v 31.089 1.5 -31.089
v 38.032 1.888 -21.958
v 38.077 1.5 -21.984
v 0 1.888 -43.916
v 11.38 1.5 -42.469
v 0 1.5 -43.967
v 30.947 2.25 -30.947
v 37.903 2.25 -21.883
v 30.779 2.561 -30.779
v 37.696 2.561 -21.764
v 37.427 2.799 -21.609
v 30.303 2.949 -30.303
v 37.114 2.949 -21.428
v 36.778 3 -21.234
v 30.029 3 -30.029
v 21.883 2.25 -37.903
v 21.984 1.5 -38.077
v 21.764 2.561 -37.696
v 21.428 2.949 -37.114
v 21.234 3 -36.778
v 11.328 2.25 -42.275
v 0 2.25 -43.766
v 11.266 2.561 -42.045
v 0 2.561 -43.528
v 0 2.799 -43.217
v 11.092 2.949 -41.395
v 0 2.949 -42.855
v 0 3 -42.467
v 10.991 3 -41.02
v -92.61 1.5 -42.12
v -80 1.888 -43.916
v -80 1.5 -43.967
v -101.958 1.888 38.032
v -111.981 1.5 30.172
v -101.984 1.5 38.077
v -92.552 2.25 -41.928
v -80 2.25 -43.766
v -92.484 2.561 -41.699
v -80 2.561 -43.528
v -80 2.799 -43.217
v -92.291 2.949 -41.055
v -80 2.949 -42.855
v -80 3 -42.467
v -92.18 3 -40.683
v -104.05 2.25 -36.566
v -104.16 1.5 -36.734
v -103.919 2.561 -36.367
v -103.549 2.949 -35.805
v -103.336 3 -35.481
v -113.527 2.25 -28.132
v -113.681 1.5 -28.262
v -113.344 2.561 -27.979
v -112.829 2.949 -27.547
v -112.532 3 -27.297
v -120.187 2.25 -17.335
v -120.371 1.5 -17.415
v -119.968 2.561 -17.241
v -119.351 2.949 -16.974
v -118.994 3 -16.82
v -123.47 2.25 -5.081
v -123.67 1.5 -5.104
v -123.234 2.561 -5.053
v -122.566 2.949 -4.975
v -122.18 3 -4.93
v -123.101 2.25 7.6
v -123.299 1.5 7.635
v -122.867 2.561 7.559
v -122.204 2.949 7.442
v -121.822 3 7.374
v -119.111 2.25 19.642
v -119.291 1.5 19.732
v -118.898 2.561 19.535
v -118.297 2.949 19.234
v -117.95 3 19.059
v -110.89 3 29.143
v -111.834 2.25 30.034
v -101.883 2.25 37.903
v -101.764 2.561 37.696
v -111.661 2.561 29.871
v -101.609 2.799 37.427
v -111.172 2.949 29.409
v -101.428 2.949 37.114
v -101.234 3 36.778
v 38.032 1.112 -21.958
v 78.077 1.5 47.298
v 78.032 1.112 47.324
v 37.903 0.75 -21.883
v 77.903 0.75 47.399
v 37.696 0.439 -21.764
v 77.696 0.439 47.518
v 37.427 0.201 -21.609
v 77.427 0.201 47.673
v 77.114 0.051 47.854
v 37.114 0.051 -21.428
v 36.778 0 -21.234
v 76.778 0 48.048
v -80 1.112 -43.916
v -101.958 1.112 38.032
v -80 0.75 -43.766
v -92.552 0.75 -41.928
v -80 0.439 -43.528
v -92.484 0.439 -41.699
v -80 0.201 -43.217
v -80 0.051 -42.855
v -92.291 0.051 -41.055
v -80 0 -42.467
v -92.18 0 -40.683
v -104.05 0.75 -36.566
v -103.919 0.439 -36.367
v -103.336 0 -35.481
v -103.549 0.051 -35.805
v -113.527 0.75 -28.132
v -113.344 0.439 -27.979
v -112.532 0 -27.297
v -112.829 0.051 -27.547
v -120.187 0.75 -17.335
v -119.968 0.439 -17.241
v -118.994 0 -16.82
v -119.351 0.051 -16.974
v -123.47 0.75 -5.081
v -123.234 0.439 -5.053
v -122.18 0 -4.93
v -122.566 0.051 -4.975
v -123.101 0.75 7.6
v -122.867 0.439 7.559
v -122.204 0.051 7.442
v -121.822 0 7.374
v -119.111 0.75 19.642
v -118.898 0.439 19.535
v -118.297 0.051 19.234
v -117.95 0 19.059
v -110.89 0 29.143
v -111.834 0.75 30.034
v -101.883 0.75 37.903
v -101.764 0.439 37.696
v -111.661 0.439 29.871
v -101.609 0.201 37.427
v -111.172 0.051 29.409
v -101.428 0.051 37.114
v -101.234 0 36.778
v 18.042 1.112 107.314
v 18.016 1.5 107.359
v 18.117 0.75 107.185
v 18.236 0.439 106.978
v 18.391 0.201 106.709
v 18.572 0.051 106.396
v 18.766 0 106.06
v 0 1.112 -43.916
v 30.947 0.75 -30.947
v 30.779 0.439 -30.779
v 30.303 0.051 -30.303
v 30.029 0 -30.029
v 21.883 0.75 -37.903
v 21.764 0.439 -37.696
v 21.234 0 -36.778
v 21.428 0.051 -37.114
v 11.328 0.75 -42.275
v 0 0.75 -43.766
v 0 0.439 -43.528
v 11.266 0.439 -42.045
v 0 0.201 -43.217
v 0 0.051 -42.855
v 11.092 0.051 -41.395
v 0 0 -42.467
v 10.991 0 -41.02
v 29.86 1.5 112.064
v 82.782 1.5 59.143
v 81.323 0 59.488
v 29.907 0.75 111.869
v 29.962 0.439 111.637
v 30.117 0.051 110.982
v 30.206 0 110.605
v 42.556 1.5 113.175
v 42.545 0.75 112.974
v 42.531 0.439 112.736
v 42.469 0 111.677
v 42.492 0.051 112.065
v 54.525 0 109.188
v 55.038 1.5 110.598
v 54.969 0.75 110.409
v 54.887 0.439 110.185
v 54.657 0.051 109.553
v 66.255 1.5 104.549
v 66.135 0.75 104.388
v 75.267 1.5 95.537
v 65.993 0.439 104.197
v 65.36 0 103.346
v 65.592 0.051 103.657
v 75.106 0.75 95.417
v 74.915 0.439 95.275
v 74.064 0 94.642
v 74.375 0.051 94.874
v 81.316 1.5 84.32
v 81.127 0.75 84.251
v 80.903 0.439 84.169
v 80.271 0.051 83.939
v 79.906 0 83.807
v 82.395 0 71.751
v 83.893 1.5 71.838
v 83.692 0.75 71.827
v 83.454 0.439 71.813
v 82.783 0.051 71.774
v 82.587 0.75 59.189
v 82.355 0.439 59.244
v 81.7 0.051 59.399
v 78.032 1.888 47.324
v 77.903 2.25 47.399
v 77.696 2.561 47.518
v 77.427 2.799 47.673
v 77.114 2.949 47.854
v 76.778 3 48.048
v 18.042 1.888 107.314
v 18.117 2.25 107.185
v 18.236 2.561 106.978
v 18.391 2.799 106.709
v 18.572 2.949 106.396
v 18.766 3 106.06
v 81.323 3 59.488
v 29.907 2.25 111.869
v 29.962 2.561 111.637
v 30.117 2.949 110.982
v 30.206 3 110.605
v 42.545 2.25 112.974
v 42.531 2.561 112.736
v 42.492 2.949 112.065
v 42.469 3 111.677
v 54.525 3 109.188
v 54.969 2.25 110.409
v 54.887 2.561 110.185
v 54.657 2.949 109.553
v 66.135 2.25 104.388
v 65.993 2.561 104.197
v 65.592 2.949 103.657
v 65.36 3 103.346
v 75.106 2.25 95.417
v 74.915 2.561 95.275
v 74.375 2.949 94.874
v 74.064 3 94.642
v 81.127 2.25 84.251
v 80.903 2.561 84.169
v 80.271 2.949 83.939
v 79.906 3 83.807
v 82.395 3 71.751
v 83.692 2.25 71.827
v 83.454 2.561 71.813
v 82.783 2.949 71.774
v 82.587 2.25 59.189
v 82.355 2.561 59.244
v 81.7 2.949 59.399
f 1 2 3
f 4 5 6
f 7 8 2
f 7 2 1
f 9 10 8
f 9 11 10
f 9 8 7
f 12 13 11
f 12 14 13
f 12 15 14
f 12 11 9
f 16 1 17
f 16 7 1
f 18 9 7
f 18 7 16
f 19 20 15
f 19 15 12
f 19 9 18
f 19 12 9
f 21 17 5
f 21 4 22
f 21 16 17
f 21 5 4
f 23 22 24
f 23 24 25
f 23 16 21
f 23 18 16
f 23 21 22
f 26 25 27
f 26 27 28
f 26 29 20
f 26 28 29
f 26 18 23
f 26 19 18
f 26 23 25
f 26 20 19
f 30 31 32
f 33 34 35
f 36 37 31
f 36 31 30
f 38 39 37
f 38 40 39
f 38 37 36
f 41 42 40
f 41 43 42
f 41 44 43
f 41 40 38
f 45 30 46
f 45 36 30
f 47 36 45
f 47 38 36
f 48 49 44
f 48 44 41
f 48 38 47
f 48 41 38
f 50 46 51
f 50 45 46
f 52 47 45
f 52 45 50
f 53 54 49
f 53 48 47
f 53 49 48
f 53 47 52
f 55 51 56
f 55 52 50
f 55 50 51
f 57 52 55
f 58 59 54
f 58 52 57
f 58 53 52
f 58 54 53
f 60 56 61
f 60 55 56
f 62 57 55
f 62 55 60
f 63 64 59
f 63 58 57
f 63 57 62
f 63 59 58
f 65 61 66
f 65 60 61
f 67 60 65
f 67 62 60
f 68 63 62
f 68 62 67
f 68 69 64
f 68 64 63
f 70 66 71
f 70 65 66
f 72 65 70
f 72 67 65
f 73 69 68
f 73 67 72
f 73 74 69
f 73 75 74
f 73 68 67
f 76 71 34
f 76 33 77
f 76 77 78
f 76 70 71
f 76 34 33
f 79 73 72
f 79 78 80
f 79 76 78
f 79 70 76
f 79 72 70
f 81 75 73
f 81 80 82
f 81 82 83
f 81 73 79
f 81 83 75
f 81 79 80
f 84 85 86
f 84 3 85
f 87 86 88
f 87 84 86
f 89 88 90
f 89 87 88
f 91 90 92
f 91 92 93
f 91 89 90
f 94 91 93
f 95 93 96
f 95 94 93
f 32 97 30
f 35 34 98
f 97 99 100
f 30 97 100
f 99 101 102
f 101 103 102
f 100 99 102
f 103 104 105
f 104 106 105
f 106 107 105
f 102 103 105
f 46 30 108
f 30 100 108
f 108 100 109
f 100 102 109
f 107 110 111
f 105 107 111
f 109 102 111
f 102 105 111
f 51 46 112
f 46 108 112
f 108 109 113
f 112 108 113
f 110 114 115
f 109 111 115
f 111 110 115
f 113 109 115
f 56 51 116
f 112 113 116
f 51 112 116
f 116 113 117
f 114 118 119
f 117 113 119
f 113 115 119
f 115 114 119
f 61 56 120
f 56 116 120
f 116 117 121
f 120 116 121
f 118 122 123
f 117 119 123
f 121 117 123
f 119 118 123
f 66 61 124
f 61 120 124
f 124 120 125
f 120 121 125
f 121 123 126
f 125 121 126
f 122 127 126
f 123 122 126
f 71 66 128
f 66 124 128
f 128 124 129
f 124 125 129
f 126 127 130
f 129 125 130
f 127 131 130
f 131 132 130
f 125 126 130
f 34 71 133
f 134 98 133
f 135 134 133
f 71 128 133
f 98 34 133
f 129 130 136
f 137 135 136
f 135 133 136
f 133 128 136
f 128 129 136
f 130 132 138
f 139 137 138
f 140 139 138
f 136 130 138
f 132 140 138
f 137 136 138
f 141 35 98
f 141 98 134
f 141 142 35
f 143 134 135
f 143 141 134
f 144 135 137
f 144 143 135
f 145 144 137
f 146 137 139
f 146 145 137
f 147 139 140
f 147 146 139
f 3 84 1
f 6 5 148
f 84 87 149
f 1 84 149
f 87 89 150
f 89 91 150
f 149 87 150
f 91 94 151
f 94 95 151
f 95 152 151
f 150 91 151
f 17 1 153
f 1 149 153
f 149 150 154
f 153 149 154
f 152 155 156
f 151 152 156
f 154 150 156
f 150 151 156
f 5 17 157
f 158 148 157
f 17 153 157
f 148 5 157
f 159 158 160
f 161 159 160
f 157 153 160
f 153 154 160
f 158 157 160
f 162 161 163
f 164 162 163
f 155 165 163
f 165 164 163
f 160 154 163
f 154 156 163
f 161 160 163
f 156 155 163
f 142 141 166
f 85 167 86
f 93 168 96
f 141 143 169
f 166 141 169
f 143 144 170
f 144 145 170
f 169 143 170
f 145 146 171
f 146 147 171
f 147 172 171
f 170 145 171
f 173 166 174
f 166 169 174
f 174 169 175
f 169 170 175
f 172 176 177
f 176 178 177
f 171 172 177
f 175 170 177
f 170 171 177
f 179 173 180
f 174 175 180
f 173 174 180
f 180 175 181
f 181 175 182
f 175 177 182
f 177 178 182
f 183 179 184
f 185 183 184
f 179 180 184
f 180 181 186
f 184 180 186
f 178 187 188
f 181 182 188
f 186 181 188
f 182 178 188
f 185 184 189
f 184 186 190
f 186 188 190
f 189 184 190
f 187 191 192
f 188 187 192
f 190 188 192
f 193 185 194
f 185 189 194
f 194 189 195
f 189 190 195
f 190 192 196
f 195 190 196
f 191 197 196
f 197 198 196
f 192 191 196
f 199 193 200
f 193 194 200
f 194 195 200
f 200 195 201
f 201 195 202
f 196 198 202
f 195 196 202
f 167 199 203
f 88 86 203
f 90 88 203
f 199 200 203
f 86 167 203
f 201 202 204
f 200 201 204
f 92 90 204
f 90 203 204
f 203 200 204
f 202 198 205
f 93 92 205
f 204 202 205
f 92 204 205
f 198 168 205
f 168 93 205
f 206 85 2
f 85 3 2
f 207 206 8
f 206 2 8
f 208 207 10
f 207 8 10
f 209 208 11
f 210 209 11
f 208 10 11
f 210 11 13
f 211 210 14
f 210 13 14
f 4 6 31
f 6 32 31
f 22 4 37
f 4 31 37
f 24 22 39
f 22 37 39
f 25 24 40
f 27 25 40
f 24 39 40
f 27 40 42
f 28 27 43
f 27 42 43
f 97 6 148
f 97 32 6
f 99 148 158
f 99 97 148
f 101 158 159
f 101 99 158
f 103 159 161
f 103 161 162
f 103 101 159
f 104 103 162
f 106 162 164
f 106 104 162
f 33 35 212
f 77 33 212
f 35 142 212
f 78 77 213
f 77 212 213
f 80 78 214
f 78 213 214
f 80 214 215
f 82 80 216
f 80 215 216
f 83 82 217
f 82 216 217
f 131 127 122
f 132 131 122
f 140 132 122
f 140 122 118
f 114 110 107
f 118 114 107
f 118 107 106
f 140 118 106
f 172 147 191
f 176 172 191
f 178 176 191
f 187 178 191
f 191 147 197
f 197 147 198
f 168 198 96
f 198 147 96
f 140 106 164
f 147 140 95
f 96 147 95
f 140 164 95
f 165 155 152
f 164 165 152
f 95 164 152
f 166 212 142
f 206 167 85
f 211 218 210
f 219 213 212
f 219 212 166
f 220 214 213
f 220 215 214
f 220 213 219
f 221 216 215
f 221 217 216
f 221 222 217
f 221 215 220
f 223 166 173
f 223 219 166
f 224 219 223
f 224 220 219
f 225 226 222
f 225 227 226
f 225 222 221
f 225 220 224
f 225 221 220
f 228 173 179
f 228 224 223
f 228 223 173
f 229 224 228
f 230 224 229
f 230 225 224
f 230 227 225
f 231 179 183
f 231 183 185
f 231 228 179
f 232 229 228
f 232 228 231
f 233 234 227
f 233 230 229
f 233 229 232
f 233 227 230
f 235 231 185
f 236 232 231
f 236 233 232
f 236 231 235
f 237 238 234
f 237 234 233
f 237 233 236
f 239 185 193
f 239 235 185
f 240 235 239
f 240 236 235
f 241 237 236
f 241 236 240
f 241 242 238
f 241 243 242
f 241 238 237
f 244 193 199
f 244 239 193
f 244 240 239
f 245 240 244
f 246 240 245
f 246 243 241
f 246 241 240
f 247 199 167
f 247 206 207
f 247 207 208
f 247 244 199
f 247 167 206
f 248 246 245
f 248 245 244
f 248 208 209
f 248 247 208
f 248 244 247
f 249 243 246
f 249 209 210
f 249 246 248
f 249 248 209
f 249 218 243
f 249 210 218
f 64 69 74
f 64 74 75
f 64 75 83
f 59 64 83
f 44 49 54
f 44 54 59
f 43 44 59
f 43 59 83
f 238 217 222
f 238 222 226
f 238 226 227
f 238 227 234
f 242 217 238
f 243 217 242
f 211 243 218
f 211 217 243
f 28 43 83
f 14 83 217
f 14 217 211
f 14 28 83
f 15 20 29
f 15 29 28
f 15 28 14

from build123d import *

# Parameters (mm, degrees)
DODANIE_WYCI_GNI_CIE1_DEPTH = 3
ZAOKR_GLENIE1_R             = 1.5


with BuildPart() as part:
    # Szkic1 → Dodanie-wyciągnięcie1 (new body)
    with BuildSketch(Plane(origin=(0, 0, 0), x_dir=(1, 0, 0), z_dir=(0, 1, 0))):
        with BuildLine():
            Line((0, 43.967189626), (-80, 43.967189626))
            ThreePointArc((-80, 43.967189626), (-122.469043969, 11.379546035), (-101.983594813, -38.076703149))
            Line((-101.983594813, -38.076703149), (18.016405187, -107.358735452))
            ThreePointArc((18.016405187, -107.358735452), (71.089497934, -100.371530237), (78.076703149, -47.29843749))
            Line((78.076703149, -47.29843749), (38.076703149, 21.983594813))
            ThreePointArc((38.076703149, 21.983594813), (21.983594813, 38.076703149), (0, 43.967189626))
        make_face()
    extrude(amount=DODANIE_WYCI_GNI_CIE1_DEPTH)

    # Zaokrąglenie1
    zaokr_glenie1_edges = [part.edges().sort_by_distance(p)[0] for p in [
        (-122.469043969, 3, -11.379546035),
        (-41.983594813, 3, 72.717719301),
        (71.089497934, 3, 100.371530237),
        (58.076703149, 3, 12.657421338),
        (21.983594813, 3, -38.076703149),
        (58.076703149, 0, 12.657421338),
        (-41.983594813, 0, 72.717719301),
        (-40, 0, -43.967189626),
        (-40, 3, -43.967189626),
    ]]
    fillet(zaokr_glenie1_edges, radius=ZAOKR_GLENIE1_R - 0.0001)  # a hair under: the kernel refuses the full size


solid = part.part
